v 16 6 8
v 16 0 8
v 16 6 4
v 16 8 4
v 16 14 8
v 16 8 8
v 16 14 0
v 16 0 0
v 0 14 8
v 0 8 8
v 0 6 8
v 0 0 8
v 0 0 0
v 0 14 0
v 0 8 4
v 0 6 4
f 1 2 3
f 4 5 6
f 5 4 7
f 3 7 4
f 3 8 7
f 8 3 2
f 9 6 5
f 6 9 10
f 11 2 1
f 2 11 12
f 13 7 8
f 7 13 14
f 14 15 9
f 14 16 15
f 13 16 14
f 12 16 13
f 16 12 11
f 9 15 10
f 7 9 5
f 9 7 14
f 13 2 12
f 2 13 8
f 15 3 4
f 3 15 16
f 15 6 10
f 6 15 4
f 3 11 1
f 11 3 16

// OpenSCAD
$fn = 32;

// ----------------------------------------------------------------------
// Micro clip: slotted block, 5-20 mm class
// ----------------------------------------------------------------------

// --- parameters (mm) ---
block_l = 16;             // block length, X
block_w = 14;             // block width, Y
block_h = 8;              // block height, Z
slot_w = 2;               // slot width
slot_d = 4;               // slot depth from the top

difference() {
  cube([block_l, block_w, block_h]);
  translate([-1, block_w / 2 - slot_w / 2, block_h - slot_d])
    cube([block_l + 2, slot_w, slot_d + 1]);
}
